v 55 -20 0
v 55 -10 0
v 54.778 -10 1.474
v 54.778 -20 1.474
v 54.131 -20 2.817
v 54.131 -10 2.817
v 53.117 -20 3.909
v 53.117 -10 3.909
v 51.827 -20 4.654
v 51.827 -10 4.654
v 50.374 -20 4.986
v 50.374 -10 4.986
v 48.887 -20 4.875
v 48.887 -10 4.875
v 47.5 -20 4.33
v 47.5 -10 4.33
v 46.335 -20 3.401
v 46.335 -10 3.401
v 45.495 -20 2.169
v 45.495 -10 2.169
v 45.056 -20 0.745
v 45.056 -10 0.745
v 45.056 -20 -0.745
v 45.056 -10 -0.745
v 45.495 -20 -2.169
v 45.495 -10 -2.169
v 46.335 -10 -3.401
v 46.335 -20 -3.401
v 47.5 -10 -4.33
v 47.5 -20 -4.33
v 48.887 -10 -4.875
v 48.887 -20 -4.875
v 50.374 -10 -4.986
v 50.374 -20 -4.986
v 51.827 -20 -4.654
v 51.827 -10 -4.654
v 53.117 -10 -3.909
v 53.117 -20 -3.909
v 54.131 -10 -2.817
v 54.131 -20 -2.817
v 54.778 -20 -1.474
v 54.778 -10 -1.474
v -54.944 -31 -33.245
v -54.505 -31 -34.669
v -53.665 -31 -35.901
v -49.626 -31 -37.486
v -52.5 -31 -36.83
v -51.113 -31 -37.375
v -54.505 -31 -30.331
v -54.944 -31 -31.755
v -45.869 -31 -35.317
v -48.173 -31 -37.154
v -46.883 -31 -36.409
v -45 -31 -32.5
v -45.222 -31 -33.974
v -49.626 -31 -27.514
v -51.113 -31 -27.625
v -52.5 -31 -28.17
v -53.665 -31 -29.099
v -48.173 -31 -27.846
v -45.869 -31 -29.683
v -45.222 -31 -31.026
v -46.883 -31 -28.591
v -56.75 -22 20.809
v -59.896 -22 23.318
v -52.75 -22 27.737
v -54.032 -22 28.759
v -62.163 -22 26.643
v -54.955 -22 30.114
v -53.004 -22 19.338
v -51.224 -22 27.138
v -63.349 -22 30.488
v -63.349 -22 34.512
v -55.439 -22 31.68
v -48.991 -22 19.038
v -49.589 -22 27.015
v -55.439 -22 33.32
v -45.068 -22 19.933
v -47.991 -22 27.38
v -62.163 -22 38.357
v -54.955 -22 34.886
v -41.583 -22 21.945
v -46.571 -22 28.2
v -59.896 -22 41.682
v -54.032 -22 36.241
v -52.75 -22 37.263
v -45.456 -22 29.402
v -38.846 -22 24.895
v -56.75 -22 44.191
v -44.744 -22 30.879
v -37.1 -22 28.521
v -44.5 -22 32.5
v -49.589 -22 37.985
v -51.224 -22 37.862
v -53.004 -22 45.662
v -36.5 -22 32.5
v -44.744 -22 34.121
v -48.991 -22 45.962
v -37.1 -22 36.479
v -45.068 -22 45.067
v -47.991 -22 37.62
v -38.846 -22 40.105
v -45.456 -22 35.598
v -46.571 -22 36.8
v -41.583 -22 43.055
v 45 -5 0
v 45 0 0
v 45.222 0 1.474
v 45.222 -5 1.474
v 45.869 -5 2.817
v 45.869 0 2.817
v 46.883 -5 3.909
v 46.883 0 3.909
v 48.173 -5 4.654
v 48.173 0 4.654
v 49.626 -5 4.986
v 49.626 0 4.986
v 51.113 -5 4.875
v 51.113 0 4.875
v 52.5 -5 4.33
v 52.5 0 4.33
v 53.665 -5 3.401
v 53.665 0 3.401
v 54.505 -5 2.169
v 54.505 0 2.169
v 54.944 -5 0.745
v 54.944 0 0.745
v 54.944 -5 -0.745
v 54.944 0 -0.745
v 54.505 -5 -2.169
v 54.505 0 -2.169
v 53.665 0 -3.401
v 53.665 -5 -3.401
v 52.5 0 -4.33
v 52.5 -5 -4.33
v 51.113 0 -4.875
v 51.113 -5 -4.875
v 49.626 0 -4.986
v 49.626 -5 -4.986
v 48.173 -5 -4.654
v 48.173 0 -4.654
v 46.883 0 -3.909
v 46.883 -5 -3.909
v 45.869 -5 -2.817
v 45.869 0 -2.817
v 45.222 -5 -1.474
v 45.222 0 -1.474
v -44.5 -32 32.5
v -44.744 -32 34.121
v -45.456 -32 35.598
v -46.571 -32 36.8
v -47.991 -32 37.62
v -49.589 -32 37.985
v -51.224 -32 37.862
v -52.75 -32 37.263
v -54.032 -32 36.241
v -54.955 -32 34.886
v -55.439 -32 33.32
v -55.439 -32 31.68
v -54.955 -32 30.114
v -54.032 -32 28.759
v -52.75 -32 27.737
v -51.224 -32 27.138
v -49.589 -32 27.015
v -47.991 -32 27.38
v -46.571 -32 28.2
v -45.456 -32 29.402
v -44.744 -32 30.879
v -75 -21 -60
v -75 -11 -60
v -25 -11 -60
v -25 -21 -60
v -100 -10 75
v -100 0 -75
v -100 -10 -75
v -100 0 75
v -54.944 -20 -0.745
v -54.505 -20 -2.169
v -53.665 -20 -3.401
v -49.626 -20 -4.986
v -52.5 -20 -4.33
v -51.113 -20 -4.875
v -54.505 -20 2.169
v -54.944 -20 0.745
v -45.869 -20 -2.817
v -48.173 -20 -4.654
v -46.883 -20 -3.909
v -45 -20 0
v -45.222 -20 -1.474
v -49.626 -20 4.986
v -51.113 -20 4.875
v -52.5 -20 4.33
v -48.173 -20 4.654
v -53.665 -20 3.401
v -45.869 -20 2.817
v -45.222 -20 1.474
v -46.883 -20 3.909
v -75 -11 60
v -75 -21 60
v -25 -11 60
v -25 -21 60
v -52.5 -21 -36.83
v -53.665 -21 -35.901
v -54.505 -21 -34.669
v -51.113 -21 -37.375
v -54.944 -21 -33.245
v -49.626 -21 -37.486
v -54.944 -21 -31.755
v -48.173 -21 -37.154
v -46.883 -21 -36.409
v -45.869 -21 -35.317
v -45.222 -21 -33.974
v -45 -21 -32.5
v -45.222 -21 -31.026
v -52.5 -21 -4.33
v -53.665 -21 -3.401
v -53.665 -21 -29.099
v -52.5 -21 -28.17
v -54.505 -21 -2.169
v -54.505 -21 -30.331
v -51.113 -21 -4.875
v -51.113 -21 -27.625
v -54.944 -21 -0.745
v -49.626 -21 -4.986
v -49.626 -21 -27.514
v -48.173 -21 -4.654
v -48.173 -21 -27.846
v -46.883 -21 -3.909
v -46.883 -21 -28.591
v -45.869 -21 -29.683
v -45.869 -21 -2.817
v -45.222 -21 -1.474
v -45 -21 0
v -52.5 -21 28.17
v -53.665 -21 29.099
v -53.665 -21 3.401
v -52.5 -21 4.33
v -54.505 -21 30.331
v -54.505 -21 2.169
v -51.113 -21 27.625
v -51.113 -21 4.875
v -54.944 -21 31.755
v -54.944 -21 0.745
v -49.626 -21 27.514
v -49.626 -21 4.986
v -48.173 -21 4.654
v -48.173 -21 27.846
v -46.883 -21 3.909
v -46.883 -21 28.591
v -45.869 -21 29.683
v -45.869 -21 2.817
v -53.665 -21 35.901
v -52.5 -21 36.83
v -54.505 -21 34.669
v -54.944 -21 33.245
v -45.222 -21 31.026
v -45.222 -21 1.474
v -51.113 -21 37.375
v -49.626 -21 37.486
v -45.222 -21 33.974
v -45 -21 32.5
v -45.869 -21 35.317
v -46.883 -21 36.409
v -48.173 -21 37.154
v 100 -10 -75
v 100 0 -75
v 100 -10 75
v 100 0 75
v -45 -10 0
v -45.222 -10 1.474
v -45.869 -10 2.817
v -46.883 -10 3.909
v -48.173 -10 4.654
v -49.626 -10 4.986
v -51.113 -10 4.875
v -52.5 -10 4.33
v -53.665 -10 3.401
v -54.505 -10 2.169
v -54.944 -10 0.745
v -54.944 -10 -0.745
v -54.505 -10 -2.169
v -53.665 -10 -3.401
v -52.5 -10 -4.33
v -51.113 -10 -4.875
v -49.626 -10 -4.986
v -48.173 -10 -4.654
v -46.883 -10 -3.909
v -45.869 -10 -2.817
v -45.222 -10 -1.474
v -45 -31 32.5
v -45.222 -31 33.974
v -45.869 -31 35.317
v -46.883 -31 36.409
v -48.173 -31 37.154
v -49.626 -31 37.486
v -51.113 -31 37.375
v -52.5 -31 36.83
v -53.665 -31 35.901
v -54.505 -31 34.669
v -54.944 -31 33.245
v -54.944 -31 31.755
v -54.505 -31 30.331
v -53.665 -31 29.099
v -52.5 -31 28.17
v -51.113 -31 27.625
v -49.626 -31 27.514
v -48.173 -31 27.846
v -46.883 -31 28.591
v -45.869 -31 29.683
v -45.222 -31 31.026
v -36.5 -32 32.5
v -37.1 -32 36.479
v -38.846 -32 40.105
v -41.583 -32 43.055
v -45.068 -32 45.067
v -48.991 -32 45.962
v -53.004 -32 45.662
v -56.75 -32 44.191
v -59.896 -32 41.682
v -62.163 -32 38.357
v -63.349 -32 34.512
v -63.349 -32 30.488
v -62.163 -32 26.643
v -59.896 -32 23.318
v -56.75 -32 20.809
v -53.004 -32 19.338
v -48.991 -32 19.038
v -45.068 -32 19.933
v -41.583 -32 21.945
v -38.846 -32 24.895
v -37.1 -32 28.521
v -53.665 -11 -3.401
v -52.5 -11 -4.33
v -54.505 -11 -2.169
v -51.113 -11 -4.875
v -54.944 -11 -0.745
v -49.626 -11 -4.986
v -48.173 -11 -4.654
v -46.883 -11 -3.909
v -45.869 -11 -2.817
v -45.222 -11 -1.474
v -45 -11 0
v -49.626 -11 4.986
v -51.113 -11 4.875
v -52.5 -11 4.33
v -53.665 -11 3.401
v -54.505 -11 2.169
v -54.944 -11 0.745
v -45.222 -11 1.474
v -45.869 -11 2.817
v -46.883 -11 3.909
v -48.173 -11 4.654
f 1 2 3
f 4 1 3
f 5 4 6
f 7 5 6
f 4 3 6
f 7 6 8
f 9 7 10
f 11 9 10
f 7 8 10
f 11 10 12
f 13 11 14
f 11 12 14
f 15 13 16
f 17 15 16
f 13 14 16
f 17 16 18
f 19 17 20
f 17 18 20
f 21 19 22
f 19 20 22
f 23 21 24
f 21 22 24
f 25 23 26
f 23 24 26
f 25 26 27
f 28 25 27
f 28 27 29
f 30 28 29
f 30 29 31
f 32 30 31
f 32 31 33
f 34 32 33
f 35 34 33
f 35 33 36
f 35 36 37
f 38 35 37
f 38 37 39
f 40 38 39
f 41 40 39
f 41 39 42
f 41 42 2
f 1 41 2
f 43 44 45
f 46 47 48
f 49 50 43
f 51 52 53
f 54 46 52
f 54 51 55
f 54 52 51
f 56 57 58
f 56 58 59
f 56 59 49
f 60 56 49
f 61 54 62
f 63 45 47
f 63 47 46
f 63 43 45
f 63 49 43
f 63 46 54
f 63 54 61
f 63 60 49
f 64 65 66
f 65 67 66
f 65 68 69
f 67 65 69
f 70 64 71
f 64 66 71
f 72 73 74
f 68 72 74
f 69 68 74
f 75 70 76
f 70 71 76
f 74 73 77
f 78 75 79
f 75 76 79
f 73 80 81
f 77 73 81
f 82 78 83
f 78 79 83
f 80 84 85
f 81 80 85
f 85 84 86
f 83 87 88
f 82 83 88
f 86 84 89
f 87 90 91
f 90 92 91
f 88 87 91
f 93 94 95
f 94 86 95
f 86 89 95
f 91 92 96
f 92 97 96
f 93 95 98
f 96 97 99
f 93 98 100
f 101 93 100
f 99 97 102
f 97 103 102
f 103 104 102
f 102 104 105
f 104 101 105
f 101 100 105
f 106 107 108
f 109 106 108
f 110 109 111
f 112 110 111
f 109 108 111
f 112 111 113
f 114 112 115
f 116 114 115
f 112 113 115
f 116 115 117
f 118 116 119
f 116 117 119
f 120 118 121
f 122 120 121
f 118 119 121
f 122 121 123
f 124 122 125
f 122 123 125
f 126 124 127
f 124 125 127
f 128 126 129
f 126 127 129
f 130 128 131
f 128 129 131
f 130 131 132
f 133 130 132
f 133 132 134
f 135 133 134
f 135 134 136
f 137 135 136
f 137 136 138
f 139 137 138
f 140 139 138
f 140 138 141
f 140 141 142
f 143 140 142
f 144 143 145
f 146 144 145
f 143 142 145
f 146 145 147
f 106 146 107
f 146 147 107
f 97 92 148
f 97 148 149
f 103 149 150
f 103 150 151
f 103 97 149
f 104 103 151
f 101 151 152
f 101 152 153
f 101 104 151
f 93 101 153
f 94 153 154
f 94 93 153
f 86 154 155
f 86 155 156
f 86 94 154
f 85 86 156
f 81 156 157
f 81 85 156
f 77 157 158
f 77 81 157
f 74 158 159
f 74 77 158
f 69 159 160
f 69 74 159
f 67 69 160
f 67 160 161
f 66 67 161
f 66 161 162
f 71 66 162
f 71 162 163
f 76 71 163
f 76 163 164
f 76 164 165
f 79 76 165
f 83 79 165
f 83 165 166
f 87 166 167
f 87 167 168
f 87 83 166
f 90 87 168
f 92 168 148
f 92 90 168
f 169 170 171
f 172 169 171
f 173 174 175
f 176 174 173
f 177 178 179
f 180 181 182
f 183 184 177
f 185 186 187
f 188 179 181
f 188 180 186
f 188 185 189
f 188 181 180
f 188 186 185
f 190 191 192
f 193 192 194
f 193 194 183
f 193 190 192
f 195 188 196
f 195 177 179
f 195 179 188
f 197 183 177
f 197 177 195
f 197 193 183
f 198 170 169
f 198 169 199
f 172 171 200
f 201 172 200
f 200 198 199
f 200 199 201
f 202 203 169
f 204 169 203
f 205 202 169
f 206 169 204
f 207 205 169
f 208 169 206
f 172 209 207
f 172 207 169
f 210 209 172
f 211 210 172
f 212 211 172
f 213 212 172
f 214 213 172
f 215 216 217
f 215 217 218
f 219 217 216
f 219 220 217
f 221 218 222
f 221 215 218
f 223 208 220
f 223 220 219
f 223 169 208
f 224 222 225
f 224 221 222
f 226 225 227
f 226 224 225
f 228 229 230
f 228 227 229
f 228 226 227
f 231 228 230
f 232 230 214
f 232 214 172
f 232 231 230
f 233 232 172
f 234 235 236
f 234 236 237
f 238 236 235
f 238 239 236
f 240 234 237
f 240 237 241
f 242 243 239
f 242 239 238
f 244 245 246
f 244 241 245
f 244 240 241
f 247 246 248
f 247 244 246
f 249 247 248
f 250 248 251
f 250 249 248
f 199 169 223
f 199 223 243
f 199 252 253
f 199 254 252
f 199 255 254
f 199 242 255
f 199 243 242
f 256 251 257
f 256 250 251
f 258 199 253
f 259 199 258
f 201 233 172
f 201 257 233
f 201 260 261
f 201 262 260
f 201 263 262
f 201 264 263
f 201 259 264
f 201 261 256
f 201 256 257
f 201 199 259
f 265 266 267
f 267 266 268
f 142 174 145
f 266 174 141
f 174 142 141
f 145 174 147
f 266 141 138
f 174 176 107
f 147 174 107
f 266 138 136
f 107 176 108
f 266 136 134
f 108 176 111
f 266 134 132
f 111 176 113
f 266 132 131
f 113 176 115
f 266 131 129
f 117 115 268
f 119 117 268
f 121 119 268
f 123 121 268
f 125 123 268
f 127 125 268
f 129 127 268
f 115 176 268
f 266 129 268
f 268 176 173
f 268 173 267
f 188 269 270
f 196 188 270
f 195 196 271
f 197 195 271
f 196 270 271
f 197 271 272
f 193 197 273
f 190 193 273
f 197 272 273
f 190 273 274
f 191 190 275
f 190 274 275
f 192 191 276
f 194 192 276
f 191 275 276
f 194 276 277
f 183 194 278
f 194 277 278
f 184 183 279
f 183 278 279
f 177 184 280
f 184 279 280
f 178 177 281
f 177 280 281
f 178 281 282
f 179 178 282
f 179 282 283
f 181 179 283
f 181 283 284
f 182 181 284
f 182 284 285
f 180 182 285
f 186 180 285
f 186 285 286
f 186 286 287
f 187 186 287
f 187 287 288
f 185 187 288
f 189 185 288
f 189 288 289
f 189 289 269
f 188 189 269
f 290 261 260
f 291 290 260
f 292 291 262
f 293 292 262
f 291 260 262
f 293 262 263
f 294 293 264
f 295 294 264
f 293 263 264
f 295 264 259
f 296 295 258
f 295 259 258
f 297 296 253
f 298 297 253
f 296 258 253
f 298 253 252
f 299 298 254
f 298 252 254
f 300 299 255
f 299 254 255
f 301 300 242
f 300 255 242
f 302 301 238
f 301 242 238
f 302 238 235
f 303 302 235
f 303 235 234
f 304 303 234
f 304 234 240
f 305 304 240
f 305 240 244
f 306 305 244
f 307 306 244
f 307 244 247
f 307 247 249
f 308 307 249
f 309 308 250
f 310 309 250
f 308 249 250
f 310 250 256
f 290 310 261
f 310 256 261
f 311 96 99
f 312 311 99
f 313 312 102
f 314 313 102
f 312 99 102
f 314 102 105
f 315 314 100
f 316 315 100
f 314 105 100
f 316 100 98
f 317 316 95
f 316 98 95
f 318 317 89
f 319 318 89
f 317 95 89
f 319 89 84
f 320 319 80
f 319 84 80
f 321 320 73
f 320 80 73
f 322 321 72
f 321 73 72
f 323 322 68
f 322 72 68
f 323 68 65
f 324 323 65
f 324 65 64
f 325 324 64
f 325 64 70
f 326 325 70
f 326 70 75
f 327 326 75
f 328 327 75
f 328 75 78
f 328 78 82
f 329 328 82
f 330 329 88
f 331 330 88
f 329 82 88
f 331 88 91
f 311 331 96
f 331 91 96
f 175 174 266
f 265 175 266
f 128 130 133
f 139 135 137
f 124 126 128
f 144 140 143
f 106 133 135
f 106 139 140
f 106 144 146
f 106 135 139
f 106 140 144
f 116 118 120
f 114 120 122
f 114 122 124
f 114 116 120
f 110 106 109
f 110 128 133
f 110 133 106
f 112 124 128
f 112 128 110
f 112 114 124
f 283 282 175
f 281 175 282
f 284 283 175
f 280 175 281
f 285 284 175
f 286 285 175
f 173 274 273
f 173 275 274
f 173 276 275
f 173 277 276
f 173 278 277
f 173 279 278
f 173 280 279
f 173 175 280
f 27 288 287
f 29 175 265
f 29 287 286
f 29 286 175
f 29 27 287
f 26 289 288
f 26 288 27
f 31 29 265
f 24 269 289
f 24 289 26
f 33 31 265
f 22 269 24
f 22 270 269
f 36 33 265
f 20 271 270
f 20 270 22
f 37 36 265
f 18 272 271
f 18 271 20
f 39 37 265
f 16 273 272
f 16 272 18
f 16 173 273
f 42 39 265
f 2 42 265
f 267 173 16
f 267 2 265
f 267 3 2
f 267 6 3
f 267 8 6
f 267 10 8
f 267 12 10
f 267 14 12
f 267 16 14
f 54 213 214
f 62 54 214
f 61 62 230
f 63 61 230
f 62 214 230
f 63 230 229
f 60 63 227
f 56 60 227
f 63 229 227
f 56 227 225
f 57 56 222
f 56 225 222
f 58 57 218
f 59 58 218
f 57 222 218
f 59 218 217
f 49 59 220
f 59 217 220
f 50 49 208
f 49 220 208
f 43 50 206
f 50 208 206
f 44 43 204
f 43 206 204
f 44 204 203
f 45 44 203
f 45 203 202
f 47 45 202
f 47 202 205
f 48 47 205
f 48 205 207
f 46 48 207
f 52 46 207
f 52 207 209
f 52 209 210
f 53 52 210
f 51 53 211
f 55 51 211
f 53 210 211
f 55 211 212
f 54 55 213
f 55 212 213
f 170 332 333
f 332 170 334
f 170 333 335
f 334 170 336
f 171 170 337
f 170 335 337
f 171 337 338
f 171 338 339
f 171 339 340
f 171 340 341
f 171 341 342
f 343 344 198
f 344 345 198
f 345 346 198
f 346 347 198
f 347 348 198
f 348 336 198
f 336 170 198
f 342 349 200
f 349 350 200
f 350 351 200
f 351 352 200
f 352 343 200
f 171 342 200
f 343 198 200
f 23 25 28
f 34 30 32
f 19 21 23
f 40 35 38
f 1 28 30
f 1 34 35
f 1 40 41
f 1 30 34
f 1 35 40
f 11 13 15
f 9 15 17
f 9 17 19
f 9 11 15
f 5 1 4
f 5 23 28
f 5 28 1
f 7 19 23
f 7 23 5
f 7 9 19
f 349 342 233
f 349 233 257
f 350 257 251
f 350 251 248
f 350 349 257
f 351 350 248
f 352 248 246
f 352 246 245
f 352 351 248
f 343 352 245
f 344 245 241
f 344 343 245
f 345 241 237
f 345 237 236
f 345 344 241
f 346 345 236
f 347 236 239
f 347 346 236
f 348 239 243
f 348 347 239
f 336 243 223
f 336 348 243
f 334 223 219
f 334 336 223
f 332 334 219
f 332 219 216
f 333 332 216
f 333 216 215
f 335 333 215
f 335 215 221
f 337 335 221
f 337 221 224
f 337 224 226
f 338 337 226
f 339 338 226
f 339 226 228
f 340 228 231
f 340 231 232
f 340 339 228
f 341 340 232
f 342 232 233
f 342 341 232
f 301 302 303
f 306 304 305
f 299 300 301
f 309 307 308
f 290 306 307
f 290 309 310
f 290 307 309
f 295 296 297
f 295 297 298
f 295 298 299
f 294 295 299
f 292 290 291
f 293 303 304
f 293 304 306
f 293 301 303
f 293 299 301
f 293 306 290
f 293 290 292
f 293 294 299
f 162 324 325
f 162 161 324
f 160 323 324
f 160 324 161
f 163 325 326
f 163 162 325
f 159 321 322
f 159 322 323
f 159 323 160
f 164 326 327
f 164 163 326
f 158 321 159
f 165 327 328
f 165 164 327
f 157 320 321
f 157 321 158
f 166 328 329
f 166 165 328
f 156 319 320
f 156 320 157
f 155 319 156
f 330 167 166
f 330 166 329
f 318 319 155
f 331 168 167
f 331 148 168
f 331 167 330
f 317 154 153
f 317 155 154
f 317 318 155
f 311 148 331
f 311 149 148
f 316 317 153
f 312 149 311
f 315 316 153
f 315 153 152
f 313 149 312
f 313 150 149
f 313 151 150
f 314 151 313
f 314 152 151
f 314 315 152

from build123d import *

# Parameters (mm, degrees)
F0_W      = 200
F0_H      = 150
F0_R      = 5
F1_DEPTH  = 10
F2_DEPTH  = 20
F5_W      = 50
F5_H      = 120
F5_R      = 5
F6_DEPTH  = 10
F9_R      = 5
F10_DEPTH = 5
F8_R      = 13.5
F8_R_2    = 5.5
F11_DEPTH = 10
F12_R     = 5
F13_DEPTH = 10


with BuildPart() as f1:
    # F0 (on Front) → F1 (new body)
    with BuildSketch(Plane.XZ):
        Rectangle(F0_W, F0_H)
        with Locations((-50, -38)):
            Circle(F0_R, mode=Mode.SUBTRACT)
        with Locations((-50, 0)):
            Circle(F0_R, mode=Mode.SUBTRACT)
        with Locations((-50, 38)):
            Circle(F0_R, mode=Mode.SUBTRACT)
        with Locations((50, 0)):
            Circle(F0_R, mode=Mode.SUBTRACT)
        with Locations((-50, 38)):
            Circle(F0_R)
        with Locations((-50, -38)):
            Circle(F0_R)
    extrude(amount=F1_DEPTH)

    # F0 (on Front) → F2 (join)
    with BuildSketch(Plane.XZ):
        with Locations((-50, 0)):
            Circle(F0_R)
        with Locations((50, 0)):
            Circle(F0_R)
    extrude(amount=F2_DEPTH)

    # F9 (on face) → F10 (cut)
    with BuildSketch(Plane(origin=(0, 0, 0), x_dir=(-1, 0, 0), z_dir=(0, 1, 0))):
        with Locations((-50, 0)):
            Circle(F9_R)
    extrude(amount=-F10_DEPTH, mode=Mode.SUBTRACT)


with BuildPart() as f6:
    # F5 (on offset) → F6 (new body)
    with BuildSketch(Plane.XZ.offset(11)):
        with Locations((-50, 0)):
            Rectangle(F5_W, F5_H)
        with Locations((-50, -38)):
            Circle(F5_R, mode=Mode.SUBTRACT)
        with Locations((-50, 0)):
            Circle(F5_R, mode=Mode.SUBTRACT)
        with Locations((-50, 38)):
            Circle(F5_R, mode=Mode.SUBTRACT)
        with Locations((-50, 38)):
            Circle(F5_R)
        with Locations((-50, -38)):
            Circle(F5_R)
    extrude(amount=F6_DEPTH)

    # F12 (on face) → F13 (join)
    with BuildSketch(Plane.XZ.offset(21)):
        with Locations((-50, 32.5)):
            Circle(F12_R)
        with Locations((-50, -32.5)):
            Circle(F12_R)
    extrude(amount=F13_DEPTH)


with BuildPart() as f11:
    # F8 (on offset) → F11 (new body)
    with BuildSketch(Plane.XZ.offset(22)):
        with Locations((-50, 32.5)):
            Circle(F8_R)
        with Locations((-50, 32.5)):
            Circle(F8_R_2, mode=Mode.SUBTRACT)
    extrude(amount=F11_DEPTH)


solid = Compound([f1.part, f6.part, f11.part])
